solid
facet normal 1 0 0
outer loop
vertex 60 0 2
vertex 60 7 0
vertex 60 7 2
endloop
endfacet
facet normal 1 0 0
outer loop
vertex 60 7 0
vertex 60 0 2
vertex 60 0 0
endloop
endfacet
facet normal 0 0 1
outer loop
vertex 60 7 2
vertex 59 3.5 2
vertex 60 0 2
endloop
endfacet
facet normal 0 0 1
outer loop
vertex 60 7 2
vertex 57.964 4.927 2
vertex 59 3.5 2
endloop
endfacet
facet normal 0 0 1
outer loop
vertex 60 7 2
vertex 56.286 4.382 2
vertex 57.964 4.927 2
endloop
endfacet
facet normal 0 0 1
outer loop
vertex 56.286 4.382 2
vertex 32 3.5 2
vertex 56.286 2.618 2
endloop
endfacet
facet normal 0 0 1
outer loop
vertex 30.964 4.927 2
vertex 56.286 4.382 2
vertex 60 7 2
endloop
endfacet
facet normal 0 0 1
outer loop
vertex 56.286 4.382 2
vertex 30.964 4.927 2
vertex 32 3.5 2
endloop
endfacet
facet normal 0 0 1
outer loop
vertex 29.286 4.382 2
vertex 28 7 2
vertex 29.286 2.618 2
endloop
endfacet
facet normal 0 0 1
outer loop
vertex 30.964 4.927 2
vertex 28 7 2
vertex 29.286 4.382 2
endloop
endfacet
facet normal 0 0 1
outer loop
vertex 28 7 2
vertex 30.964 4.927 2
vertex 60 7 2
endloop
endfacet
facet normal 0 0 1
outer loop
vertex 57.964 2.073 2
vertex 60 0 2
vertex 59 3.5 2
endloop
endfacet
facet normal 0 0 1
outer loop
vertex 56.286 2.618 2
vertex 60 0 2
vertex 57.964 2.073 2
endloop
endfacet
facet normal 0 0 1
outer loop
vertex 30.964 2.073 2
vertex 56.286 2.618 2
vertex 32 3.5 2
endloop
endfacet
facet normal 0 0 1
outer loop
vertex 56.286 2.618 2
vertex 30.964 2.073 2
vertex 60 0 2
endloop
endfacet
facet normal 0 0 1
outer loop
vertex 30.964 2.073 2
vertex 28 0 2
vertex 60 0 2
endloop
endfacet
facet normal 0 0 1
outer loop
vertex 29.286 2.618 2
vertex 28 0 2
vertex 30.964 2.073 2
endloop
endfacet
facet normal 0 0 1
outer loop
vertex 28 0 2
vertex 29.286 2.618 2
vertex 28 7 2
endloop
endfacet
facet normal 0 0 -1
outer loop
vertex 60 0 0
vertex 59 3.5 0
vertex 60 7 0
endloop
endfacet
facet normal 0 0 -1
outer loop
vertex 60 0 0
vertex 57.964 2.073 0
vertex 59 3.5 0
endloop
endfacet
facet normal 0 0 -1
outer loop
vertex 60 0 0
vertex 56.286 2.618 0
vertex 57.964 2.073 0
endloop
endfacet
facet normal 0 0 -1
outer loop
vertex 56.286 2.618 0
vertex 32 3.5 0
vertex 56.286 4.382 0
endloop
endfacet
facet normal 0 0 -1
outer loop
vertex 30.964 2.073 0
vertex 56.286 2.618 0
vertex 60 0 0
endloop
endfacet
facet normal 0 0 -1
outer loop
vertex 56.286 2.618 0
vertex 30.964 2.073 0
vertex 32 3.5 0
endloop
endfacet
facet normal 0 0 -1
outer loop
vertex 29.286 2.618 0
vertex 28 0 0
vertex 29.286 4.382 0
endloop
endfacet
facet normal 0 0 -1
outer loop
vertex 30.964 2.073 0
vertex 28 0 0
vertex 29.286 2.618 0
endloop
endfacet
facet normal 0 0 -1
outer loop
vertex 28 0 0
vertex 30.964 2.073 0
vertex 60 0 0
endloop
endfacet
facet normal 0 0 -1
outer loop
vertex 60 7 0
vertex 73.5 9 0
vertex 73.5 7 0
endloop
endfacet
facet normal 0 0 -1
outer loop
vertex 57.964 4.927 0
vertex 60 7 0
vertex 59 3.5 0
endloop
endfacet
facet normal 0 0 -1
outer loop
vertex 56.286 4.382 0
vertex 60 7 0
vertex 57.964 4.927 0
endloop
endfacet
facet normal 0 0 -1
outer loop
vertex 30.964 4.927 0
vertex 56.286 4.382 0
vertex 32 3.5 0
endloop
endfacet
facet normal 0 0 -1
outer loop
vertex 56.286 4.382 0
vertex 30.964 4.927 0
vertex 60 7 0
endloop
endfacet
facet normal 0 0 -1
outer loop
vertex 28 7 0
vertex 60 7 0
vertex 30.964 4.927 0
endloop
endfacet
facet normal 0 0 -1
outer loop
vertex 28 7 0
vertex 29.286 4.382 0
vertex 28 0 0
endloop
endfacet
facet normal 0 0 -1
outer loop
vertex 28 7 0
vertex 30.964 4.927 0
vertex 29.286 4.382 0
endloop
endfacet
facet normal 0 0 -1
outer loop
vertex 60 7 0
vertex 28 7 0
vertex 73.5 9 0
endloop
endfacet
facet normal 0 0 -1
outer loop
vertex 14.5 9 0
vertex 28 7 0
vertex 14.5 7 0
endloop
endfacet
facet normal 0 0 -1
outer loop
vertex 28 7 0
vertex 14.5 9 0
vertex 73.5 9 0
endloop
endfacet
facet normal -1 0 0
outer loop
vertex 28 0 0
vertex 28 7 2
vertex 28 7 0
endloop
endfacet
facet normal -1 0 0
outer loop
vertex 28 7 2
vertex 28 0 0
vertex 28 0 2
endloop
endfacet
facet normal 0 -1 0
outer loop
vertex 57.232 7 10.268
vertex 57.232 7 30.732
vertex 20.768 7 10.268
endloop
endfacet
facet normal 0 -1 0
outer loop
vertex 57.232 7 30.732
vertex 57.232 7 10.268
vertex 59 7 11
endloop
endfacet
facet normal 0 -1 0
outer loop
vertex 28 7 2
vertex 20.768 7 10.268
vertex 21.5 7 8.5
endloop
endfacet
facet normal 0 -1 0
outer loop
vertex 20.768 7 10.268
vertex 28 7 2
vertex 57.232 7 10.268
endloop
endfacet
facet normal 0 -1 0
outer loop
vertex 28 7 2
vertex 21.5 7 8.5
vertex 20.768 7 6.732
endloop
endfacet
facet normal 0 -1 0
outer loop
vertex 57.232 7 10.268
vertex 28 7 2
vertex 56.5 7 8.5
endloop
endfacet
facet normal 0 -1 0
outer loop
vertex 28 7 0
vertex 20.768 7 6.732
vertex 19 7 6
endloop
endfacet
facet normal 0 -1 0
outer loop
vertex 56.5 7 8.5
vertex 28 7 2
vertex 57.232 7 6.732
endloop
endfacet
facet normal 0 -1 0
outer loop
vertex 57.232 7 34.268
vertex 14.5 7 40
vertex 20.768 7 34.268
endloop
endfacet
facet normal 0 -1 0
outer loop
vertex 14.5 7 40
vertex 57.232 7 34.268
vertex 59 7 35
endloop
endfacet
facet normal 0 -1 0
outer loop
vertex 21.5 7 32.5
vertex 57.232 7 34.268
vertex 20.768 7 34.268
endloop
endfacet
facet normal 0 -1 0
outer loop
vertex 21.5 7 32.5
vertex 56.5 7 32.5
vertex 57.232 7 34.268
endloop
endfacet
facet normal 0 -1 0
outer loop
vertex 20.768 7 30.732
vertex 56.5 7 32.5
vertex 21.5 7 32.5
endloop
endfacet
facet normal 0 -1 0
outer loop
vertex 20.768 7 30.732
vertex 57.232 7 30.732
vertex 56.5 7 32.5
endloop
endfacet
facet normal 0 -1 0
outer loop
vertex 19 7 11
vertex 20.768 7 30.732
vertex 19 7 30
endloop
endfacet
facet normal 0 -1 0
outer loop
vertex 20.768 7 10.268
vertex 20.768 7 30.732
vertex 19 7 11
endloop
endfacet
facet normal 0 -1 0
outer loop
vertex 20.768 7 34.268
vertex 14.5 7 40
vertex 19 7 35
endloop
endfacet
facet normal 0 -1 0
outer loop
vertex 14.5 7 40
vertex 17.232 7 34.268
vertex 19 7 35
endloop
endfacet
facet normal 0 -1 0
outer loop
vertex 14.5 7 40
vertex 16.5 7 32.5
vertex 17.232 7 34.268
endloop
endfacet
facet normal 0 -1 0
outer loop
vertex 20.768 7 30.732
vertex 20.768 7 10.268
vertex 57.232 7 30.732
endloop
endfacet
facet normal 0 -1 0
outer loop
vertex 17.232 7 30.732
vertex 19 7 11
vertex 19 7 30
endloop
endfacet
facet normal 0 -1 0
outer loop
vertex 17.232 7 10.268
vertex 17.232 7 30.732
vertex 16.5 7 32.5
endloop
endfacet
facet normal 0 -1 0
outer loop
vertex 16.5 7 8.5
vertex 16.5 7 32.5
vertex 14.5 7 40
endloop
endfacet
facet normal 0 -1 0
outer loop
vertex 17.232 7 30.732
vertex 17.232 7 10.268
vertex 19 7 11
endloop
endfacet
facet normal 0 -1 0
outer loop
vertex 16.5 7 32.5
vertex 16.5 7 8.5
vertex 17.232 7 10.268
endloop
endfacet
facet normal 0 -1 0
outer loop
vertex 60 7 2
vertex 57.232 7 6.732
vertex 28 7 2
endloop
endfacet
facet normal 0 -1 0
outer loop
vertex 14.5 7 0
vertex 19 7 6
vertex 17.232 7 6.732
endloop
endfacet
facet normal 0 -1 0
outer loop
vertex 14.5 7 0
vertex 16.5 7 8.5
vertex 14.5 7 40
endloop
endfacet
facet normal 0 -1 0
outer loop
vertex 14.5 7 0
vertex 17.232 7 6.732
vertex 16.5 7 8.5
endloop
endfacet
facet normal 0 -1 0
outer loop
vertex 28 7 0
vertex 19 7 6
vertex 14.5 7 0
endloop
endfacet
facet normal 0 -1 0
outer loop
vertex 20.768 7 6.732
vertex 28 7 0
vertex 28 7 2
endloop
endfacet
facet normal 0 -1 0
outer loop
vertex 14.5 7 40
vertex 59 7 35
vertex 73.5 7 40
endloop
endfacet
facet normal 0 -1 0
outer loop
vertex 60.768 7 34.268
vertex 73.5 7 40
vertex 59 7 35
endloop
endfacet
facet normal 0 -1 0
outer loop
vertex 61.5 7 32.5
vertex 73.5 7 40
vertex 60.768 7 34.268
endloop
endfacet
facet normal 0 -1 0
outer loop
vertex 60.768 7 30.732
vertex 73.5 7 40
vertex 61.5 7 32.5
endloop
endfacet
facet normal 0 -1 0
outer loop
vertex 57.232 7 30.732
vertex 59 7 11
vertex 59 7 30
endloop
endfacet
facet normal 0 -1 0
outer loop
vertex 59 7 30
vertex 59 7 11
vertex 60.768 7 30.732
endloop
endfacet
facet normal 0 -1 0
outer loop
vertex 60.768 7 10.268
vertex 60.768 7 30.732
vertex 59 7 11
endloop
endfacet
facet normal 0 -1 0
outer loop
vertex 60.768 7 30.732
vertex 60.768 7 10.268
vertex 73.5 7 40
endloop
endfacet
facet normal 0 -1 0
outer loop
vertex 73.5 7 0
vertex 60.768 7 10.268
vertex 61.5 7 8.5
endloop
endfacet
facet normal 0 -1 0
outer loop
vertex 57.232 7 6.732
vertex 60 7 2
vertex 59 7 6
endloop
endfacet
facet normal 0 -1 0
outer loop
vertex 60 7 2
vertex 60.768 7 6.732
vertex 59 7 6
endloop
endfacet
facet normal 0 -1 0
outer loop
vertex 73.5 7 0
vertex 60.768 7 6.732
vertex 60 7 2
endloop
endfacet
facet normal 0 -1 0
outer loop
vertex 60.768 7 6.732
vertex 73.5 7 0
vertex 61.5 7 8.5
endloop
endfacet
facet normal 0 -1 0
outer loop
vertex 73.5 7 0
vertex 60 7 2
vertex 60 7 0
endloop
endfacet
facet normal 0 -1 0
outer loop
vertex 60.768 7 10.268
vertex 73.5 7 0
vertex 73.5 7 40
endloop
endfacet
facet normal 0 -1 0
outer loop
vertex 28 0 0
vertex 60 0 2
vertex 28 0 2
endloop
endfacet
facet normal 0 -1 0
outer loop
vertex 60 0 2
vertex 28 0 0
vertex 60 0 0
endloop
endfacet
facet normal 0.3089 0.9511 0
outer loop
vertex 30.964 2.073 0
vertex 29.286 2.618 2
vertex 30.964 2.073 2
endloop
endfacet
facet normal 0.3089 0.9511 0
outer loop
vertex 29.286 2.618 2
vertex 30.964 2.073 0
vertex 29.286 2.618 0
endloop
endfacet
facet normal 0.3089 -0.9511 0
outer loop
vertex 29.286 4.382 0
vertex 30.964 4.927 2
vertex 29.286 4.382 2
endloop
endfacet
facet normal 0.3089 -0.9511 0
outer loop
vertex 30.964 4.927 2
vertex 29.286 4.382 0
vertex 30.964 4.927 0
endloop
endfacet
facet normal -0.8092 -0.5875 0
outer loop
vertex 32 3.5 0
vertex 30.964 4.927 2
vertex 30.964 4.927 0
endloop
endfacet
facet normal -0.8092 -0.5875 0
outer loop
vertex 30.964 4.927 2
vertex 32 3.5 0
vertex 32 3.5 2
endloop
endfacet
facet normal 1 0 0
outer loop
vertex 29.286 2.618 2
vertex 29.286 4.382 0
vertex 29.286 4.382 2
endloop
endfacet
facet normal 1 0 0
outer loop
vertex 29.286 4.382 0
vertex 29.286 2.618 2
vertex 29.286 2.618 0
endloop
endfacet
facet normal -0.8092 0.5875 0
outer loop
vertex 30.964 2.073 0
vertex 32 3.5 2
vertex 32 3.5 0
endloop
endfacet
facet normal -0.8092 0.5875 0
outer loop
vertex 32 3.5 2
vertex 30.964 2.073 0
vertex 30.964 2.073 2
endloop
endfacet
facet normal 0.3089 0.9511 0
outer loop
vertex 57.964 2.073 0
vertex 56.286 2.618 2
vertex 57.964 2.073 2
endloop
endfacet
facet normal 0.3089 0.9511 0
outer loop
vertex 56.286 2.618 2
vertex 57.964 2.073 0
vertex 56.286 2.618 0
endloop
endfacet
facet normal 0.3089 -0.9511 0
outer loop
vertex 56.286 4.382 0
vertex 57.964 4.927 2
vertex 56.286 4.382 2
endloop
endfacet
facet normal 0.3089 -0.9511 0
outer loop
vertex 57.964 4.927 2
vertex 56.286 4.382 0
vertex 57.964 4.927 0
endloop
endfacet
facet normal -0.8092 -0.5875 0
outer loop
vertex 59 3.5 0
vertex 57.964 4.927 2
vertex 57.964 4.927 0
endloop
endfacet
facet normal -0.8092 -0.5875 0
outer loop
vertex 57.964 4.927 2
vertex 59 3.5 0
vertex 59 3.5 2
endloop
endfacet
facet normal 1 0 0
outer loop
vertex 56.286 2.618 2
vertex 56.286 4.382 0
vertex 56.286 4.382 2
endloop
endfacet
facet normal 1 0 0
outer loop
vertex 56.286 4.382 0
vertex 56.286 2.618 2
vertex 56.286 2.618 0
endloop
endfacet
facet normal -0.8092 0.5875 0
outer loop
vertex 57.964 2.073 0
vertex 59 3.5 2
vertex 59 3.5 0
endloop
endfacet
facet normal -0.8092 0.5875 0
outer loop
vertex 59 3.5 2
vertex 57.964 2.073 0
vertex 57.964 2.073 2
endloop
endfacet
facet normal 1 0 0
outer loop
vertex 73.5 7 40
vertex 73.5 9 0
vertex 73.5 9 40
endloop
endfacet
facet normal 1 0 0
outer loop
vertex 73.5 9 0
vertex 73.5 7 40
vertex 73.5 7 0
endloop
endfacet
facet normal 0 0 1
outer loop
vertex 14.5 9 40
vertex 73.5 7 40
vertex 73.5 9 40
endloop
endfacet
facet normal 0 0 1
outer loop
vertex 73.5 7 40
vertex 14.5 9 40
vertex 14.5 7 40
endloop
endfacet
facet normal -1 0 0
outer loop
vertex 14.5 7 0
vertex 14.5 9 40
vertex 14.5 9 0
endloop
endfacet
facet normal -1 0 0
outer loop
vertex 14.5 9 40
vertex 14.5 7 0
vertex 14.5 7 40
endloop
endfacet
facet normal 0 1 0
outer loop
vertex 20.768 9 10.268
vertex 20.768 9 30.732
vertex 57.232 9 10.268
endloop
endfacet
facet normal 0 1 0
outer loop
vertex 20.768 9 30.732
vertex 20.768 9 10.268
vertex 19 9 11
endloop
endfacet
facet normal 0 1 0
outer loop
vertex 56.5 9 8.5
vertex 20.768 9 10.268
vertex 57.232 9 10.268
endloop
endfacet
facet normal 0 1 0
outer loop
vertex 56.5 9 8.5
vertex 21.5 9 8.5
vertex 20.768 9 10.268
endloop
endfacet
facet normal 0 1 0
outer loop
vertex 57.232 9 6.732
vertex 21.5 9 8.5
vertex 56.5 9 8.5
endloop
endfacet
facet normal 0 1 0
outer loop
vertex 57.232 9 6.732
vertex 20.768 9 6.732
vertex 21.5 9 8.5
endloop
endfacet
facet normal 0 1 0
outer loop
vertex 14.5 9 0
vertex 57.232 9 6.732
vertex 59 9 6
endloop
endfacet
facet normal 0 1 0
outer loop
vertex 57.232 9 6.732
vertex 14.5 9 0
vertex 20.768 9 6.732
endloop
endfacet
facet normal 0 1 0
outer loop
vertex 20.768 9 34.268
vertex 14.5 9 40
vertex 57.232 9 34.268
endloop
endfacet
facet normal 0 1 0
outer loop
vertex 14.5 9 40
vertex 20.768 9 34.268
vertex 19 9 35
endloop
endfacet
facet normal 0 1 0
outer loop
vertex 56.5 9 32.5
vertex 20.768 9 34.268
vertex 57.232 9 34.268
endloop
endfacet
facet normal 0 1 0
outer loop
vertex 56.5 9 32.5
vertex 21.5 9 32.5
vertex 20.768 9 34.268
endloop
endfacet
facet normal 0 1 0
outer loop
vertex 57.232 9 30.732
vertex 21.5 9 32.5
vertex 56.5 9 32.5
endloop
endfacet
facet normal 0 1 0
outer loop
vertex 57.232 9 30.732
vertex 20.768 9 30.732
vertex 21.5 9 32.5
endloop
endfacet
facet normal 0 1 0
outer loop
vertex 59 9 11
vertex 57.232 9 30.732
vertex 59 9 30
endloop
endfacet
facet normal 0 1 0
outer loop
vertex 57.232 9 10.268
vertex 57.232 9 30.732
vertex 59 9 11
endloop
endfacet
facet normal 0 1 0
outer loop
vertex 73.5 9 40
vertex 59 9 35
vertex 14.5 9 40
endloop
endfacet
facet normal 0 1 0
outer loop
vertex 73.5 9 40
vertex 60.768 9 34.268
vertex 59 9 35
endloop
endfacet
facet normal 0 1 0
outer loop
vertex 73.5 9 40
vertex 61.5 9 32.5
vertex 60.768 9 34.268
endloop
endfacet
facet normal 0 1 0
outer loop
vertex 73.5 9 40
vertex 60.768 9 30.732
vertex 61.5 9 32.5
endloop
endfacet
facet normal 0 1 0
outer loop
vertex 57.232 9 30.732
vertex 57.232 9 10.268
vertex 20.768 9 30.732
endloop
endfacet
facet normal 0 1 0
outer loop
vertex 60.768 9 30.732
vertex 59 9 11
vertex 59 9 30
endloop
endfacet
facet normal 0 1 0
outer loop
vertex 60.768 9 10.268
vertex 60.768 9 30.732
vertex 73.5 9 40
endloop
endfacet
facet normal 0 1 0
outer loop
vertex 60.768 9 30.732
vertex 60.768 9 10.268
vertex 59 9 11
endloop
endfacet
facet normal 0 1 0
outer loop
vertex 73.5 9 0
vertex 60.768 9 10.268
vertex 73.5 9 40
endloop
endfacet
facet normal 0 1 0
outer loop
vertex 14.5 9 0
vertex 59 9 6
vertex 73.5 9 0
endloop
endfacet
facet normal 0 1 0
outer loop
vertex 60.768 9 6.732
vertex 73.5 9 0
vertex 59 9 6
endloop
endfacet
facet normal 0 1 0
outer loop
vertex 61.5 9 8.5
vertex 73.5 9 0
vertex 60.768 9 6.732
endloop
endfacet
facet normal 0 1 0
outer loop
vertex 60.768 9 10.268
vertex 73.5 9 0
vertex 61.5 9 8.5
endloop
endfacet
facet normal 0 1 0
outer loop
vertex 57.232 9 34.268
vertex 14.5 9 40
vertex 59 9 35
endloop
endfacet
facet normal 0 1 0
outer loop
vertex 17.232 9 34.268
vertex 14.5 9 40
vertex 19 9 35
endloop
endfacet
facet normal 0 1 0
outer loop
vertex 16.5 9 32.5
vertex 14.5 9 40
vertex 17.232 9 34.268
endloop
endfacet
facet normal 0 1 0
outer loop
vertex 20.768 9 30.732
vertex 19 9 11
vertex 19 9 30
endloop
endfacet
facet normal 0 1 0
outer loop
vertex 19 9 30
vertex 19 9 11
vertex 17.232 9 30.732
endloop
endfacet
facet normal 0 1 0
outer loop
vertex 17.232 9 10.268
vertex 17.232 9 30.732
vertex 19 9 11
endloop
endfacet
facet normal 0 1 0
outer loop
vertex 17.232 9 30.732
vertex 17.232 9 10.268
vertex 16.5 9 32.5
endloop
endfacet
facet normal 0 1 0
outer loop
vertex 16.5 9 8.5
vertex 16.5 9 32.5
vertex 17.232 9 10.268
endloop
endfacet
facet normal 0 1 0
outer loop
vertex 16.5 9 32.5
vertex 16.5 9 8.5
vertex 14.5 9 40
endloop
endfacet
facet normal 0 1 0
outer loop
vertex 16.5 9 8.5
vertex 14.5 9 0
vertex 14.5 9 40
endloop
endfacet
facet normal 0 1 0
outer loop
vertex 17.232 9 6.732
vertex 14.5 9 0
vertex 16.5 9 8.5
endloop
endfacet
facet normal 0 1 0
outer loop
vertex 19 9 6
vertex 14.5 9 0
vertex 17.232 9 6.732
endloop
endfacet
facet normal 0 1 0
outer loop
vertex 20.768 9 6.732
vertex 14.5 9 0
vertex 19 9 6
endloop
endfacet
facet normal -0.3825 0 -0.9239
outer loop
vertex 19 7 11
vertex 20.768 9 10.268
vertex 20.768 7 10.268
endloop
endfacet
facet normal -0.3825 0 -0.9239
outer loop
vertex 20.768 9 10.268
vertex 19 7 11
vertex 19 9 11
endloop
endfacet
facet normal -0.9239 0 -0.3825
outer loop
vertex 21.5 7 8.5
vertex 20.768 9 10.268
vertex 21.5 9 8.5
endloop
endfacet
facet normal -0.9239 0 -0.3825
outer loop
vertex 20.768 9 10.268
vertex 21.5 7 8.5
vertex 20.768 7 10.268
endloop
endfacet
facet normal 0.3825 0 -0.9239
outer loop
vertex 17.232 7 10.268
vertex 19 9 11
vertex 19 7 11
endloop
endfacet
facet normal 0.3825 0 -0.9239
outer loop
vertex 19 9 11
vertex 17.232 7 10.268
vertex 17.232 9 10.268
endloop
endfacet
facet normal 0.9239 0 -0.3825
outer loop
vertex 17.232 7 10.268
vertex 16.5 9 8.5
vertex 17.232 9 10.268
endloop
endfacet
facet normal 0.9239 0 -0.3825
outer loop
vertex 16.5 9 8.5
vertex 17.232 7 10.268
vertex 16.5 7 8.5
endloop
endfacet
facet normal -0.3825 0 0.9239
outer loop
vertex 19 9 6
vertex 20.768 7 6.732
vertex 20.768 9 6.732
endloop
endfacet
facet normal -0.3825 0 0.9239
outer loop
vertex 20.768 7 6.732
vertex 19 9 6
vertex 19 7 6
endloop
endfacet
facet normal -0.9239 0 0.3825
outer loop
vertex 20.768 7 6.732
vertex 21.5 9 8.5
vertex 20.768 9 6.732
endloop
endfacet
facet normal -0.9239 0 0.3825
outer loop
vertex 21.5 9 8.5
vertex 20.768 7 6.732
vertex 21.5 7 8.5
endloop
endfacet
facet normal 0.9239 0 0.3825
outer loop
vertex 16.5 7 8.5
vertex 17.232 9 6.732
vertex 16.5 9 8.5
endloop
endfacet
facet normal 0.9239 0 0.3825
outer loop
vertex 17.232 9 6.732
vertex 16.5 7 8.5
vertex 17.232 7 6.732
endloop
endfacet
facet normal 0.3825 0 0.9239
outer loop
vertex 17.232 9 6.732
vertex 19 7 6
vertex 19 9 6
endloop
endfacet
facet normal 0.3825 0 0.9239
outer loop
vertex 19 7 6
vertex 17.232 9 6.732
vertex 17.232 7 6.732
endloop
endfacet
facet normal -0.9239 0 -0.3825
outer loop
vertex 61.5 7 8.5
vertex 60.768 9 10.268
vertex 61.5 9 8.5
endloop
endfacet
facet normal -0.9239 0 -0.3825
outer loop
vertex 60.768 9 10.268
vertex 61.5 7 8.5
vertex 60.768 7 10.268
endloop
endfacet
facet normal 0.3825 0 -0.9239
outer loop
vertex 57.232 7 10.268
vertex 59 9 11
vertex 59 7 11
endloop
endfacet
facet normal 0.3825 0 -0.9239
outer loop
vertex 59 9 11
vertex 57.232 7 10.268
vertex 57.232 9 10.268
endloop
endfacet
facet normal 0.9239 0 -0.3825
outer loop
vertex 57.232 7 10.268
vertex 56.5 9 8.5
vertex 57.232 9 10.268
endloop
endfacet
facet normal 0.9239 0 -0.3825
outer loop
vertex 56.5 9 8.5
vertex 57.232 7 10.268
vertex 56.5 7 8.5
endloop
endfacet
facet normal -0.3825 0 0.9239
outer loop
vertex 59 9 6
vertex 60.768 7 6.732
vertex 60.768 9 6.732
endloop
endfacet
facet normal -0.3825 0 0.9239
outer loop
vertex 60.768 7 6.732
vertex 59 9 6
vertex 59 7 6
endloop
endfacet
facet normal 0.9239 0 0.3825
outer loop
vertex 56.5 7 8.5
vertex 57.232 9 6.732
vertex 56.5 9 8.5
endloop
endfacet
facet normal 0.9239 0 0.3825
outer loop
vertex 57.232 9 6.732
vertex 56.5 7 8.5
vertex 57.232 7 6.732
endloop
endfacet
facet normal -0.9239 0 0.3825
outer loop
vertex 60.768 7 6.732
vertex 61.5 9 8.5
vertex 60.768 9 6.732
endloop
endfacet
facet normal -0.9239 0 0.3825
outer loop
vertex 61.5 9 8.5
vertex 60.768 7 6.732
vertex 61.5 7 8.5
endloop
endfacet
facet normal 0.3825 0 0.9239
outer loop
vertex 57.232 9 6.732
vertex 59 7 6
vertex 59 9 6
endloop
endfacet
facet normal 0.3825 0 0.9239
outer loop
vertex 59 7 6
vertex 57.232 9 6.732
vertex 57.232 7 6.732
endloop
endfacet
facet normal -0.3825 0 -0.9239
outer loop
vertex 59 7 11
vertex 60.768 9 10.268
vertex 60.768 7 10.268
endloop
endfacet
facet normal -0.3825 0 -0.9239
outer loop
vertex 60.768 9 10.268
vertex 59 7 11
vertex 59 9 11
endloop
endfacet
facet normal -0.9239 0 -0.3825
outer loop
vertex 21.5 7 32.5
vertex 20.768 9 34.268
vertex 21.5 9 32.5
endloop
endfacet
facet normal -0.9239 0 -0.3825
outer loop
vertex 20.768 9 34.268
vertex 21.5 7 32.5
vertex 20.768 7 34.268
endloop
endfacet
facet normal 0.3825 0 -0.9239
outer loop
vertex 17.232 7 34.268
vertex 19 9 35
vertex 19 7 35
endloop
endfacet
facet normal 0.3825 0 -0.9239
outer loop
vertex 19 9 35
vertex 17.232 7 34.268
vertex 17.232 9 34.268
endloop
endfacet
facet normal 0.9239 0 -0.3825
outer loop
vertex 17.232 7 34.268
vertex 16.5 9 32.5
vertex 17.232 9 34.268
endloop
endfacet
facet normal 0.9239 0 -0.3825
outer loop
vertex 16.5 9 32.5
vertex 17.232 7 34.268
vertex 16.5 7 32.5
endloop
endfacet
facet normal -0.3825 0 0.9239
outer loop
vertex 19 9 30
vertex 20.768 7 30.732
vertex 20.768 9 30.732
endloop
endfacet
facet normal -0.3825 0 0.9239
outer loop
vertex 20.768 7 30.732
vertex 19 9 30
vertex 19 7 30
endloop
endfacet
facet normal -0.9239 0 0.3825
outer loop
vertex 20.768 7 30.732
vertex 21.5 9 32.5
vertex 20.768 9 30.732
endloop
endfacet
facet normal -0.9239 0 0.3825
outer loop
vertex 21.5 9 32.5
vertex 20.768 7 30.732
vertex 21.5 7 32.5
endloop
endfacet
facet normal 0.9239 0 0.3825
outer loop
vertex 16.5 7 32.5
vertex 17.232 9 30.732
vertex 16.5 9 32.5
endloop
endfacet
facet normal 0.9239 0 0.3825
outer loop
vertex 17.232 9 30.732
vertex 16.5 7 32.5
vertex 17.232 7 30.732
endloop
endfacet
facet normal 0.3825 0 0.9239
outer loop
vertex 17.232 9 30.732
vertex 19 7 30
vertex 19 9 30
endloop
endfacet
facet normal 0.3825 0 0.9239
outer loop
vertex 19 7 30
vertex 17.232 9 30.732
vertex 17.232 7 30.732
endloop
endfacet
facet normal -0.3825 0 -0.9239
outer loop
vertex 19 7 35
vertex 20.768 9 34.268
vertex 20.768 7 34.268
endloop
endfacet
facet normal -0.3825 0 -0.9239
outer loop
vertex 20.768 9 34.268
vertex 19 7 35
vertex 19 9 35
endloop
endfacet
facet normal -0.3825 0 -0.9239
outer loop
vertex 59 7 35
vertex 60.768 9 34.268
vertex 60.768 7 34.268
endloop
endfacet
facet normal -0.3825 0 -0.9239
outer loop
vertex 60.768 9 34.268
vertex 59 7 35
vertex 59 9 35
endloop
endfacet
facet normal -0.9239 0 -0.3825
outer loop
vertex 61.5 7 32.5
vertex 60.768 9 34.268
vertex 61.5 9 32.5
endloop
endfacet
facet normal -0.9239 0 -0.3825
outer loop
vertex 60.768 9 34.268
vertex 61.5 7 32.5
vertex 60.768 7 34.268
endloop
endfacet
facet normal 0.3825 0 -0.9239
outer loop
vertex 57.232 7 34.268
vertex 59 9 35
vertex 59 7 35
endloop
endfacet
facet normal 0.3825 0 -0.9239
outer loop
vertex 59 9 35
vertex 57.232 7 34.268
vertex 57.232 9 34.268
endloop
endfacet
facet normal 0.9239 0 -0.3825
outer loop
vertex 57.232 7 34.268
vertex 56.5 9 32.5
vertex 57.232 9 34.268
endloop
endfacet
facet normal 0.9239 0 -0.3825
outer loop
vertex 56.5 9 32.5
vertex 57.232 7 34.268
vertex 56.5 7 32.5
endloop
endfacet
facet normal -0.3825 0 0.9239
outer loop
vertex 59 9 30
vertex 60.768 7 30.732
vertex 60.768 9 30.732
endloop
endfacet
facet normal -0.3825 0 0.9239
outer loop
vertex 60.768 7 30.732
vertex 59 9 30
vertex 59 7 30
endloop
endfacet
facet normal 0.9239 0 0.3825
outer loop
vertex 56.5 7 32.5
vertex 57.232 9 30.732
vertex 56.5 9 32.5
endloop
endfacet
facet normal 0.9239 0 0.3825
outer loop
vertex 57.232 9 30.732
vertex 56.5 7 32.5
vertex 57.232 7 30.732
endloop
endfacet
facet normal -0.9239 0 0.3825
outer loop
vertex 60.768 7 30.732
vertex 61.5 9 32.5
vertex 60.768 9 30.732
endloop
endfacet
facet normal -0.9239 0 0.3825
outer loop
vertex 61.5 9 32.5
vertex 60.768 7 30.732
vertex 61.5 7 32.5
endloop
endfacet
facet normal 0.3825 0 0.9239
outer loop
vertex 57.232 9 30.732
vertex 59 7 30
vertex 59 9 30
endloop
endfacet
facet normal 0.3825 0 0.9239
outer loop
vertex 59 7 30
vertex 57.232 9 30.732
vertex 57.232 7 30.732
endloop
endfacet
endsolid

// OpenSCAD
union(){
    translate([28,0,0]){
        difference(){
            cube([32,7,2]);
            translate([2.5,3.5,0]){
                cylinder(r=1.5,h=6); 
            }
            translate([29.5,3.5,0]){
                cylinder(r=1.5,h=6); 
            }
        }
    }
    translate([0, 7, 0]) {
        difference() {
            translate([14.5,0,0]){
                cube([59, 2, 40]);
            }
            translate([19, 2, 8.5]) { // Center of the wall
                rotate([90, 0, 0]) {
                    cylinder(r=2.5,h=6); 
                }
            }
            translate([59, 2, 8.5]) { // Center of the wall
                rotate([90, 0, 0]) {
                    cylinder(r=2.5,h=6); 
                }
            }
            translate([19, 2, 32.5]) { // Center of the wall
                rotate([90, 0, 0]) {
                    cylinder(r=2.5,h=6); 
                }
            }
            translate([59, 2, 32.5]) { // Center of the wall
                rotate([90, 0, 0]) {
                    cylinder(r=2.5,h=6); 
                }
            }
        }
    }
}
